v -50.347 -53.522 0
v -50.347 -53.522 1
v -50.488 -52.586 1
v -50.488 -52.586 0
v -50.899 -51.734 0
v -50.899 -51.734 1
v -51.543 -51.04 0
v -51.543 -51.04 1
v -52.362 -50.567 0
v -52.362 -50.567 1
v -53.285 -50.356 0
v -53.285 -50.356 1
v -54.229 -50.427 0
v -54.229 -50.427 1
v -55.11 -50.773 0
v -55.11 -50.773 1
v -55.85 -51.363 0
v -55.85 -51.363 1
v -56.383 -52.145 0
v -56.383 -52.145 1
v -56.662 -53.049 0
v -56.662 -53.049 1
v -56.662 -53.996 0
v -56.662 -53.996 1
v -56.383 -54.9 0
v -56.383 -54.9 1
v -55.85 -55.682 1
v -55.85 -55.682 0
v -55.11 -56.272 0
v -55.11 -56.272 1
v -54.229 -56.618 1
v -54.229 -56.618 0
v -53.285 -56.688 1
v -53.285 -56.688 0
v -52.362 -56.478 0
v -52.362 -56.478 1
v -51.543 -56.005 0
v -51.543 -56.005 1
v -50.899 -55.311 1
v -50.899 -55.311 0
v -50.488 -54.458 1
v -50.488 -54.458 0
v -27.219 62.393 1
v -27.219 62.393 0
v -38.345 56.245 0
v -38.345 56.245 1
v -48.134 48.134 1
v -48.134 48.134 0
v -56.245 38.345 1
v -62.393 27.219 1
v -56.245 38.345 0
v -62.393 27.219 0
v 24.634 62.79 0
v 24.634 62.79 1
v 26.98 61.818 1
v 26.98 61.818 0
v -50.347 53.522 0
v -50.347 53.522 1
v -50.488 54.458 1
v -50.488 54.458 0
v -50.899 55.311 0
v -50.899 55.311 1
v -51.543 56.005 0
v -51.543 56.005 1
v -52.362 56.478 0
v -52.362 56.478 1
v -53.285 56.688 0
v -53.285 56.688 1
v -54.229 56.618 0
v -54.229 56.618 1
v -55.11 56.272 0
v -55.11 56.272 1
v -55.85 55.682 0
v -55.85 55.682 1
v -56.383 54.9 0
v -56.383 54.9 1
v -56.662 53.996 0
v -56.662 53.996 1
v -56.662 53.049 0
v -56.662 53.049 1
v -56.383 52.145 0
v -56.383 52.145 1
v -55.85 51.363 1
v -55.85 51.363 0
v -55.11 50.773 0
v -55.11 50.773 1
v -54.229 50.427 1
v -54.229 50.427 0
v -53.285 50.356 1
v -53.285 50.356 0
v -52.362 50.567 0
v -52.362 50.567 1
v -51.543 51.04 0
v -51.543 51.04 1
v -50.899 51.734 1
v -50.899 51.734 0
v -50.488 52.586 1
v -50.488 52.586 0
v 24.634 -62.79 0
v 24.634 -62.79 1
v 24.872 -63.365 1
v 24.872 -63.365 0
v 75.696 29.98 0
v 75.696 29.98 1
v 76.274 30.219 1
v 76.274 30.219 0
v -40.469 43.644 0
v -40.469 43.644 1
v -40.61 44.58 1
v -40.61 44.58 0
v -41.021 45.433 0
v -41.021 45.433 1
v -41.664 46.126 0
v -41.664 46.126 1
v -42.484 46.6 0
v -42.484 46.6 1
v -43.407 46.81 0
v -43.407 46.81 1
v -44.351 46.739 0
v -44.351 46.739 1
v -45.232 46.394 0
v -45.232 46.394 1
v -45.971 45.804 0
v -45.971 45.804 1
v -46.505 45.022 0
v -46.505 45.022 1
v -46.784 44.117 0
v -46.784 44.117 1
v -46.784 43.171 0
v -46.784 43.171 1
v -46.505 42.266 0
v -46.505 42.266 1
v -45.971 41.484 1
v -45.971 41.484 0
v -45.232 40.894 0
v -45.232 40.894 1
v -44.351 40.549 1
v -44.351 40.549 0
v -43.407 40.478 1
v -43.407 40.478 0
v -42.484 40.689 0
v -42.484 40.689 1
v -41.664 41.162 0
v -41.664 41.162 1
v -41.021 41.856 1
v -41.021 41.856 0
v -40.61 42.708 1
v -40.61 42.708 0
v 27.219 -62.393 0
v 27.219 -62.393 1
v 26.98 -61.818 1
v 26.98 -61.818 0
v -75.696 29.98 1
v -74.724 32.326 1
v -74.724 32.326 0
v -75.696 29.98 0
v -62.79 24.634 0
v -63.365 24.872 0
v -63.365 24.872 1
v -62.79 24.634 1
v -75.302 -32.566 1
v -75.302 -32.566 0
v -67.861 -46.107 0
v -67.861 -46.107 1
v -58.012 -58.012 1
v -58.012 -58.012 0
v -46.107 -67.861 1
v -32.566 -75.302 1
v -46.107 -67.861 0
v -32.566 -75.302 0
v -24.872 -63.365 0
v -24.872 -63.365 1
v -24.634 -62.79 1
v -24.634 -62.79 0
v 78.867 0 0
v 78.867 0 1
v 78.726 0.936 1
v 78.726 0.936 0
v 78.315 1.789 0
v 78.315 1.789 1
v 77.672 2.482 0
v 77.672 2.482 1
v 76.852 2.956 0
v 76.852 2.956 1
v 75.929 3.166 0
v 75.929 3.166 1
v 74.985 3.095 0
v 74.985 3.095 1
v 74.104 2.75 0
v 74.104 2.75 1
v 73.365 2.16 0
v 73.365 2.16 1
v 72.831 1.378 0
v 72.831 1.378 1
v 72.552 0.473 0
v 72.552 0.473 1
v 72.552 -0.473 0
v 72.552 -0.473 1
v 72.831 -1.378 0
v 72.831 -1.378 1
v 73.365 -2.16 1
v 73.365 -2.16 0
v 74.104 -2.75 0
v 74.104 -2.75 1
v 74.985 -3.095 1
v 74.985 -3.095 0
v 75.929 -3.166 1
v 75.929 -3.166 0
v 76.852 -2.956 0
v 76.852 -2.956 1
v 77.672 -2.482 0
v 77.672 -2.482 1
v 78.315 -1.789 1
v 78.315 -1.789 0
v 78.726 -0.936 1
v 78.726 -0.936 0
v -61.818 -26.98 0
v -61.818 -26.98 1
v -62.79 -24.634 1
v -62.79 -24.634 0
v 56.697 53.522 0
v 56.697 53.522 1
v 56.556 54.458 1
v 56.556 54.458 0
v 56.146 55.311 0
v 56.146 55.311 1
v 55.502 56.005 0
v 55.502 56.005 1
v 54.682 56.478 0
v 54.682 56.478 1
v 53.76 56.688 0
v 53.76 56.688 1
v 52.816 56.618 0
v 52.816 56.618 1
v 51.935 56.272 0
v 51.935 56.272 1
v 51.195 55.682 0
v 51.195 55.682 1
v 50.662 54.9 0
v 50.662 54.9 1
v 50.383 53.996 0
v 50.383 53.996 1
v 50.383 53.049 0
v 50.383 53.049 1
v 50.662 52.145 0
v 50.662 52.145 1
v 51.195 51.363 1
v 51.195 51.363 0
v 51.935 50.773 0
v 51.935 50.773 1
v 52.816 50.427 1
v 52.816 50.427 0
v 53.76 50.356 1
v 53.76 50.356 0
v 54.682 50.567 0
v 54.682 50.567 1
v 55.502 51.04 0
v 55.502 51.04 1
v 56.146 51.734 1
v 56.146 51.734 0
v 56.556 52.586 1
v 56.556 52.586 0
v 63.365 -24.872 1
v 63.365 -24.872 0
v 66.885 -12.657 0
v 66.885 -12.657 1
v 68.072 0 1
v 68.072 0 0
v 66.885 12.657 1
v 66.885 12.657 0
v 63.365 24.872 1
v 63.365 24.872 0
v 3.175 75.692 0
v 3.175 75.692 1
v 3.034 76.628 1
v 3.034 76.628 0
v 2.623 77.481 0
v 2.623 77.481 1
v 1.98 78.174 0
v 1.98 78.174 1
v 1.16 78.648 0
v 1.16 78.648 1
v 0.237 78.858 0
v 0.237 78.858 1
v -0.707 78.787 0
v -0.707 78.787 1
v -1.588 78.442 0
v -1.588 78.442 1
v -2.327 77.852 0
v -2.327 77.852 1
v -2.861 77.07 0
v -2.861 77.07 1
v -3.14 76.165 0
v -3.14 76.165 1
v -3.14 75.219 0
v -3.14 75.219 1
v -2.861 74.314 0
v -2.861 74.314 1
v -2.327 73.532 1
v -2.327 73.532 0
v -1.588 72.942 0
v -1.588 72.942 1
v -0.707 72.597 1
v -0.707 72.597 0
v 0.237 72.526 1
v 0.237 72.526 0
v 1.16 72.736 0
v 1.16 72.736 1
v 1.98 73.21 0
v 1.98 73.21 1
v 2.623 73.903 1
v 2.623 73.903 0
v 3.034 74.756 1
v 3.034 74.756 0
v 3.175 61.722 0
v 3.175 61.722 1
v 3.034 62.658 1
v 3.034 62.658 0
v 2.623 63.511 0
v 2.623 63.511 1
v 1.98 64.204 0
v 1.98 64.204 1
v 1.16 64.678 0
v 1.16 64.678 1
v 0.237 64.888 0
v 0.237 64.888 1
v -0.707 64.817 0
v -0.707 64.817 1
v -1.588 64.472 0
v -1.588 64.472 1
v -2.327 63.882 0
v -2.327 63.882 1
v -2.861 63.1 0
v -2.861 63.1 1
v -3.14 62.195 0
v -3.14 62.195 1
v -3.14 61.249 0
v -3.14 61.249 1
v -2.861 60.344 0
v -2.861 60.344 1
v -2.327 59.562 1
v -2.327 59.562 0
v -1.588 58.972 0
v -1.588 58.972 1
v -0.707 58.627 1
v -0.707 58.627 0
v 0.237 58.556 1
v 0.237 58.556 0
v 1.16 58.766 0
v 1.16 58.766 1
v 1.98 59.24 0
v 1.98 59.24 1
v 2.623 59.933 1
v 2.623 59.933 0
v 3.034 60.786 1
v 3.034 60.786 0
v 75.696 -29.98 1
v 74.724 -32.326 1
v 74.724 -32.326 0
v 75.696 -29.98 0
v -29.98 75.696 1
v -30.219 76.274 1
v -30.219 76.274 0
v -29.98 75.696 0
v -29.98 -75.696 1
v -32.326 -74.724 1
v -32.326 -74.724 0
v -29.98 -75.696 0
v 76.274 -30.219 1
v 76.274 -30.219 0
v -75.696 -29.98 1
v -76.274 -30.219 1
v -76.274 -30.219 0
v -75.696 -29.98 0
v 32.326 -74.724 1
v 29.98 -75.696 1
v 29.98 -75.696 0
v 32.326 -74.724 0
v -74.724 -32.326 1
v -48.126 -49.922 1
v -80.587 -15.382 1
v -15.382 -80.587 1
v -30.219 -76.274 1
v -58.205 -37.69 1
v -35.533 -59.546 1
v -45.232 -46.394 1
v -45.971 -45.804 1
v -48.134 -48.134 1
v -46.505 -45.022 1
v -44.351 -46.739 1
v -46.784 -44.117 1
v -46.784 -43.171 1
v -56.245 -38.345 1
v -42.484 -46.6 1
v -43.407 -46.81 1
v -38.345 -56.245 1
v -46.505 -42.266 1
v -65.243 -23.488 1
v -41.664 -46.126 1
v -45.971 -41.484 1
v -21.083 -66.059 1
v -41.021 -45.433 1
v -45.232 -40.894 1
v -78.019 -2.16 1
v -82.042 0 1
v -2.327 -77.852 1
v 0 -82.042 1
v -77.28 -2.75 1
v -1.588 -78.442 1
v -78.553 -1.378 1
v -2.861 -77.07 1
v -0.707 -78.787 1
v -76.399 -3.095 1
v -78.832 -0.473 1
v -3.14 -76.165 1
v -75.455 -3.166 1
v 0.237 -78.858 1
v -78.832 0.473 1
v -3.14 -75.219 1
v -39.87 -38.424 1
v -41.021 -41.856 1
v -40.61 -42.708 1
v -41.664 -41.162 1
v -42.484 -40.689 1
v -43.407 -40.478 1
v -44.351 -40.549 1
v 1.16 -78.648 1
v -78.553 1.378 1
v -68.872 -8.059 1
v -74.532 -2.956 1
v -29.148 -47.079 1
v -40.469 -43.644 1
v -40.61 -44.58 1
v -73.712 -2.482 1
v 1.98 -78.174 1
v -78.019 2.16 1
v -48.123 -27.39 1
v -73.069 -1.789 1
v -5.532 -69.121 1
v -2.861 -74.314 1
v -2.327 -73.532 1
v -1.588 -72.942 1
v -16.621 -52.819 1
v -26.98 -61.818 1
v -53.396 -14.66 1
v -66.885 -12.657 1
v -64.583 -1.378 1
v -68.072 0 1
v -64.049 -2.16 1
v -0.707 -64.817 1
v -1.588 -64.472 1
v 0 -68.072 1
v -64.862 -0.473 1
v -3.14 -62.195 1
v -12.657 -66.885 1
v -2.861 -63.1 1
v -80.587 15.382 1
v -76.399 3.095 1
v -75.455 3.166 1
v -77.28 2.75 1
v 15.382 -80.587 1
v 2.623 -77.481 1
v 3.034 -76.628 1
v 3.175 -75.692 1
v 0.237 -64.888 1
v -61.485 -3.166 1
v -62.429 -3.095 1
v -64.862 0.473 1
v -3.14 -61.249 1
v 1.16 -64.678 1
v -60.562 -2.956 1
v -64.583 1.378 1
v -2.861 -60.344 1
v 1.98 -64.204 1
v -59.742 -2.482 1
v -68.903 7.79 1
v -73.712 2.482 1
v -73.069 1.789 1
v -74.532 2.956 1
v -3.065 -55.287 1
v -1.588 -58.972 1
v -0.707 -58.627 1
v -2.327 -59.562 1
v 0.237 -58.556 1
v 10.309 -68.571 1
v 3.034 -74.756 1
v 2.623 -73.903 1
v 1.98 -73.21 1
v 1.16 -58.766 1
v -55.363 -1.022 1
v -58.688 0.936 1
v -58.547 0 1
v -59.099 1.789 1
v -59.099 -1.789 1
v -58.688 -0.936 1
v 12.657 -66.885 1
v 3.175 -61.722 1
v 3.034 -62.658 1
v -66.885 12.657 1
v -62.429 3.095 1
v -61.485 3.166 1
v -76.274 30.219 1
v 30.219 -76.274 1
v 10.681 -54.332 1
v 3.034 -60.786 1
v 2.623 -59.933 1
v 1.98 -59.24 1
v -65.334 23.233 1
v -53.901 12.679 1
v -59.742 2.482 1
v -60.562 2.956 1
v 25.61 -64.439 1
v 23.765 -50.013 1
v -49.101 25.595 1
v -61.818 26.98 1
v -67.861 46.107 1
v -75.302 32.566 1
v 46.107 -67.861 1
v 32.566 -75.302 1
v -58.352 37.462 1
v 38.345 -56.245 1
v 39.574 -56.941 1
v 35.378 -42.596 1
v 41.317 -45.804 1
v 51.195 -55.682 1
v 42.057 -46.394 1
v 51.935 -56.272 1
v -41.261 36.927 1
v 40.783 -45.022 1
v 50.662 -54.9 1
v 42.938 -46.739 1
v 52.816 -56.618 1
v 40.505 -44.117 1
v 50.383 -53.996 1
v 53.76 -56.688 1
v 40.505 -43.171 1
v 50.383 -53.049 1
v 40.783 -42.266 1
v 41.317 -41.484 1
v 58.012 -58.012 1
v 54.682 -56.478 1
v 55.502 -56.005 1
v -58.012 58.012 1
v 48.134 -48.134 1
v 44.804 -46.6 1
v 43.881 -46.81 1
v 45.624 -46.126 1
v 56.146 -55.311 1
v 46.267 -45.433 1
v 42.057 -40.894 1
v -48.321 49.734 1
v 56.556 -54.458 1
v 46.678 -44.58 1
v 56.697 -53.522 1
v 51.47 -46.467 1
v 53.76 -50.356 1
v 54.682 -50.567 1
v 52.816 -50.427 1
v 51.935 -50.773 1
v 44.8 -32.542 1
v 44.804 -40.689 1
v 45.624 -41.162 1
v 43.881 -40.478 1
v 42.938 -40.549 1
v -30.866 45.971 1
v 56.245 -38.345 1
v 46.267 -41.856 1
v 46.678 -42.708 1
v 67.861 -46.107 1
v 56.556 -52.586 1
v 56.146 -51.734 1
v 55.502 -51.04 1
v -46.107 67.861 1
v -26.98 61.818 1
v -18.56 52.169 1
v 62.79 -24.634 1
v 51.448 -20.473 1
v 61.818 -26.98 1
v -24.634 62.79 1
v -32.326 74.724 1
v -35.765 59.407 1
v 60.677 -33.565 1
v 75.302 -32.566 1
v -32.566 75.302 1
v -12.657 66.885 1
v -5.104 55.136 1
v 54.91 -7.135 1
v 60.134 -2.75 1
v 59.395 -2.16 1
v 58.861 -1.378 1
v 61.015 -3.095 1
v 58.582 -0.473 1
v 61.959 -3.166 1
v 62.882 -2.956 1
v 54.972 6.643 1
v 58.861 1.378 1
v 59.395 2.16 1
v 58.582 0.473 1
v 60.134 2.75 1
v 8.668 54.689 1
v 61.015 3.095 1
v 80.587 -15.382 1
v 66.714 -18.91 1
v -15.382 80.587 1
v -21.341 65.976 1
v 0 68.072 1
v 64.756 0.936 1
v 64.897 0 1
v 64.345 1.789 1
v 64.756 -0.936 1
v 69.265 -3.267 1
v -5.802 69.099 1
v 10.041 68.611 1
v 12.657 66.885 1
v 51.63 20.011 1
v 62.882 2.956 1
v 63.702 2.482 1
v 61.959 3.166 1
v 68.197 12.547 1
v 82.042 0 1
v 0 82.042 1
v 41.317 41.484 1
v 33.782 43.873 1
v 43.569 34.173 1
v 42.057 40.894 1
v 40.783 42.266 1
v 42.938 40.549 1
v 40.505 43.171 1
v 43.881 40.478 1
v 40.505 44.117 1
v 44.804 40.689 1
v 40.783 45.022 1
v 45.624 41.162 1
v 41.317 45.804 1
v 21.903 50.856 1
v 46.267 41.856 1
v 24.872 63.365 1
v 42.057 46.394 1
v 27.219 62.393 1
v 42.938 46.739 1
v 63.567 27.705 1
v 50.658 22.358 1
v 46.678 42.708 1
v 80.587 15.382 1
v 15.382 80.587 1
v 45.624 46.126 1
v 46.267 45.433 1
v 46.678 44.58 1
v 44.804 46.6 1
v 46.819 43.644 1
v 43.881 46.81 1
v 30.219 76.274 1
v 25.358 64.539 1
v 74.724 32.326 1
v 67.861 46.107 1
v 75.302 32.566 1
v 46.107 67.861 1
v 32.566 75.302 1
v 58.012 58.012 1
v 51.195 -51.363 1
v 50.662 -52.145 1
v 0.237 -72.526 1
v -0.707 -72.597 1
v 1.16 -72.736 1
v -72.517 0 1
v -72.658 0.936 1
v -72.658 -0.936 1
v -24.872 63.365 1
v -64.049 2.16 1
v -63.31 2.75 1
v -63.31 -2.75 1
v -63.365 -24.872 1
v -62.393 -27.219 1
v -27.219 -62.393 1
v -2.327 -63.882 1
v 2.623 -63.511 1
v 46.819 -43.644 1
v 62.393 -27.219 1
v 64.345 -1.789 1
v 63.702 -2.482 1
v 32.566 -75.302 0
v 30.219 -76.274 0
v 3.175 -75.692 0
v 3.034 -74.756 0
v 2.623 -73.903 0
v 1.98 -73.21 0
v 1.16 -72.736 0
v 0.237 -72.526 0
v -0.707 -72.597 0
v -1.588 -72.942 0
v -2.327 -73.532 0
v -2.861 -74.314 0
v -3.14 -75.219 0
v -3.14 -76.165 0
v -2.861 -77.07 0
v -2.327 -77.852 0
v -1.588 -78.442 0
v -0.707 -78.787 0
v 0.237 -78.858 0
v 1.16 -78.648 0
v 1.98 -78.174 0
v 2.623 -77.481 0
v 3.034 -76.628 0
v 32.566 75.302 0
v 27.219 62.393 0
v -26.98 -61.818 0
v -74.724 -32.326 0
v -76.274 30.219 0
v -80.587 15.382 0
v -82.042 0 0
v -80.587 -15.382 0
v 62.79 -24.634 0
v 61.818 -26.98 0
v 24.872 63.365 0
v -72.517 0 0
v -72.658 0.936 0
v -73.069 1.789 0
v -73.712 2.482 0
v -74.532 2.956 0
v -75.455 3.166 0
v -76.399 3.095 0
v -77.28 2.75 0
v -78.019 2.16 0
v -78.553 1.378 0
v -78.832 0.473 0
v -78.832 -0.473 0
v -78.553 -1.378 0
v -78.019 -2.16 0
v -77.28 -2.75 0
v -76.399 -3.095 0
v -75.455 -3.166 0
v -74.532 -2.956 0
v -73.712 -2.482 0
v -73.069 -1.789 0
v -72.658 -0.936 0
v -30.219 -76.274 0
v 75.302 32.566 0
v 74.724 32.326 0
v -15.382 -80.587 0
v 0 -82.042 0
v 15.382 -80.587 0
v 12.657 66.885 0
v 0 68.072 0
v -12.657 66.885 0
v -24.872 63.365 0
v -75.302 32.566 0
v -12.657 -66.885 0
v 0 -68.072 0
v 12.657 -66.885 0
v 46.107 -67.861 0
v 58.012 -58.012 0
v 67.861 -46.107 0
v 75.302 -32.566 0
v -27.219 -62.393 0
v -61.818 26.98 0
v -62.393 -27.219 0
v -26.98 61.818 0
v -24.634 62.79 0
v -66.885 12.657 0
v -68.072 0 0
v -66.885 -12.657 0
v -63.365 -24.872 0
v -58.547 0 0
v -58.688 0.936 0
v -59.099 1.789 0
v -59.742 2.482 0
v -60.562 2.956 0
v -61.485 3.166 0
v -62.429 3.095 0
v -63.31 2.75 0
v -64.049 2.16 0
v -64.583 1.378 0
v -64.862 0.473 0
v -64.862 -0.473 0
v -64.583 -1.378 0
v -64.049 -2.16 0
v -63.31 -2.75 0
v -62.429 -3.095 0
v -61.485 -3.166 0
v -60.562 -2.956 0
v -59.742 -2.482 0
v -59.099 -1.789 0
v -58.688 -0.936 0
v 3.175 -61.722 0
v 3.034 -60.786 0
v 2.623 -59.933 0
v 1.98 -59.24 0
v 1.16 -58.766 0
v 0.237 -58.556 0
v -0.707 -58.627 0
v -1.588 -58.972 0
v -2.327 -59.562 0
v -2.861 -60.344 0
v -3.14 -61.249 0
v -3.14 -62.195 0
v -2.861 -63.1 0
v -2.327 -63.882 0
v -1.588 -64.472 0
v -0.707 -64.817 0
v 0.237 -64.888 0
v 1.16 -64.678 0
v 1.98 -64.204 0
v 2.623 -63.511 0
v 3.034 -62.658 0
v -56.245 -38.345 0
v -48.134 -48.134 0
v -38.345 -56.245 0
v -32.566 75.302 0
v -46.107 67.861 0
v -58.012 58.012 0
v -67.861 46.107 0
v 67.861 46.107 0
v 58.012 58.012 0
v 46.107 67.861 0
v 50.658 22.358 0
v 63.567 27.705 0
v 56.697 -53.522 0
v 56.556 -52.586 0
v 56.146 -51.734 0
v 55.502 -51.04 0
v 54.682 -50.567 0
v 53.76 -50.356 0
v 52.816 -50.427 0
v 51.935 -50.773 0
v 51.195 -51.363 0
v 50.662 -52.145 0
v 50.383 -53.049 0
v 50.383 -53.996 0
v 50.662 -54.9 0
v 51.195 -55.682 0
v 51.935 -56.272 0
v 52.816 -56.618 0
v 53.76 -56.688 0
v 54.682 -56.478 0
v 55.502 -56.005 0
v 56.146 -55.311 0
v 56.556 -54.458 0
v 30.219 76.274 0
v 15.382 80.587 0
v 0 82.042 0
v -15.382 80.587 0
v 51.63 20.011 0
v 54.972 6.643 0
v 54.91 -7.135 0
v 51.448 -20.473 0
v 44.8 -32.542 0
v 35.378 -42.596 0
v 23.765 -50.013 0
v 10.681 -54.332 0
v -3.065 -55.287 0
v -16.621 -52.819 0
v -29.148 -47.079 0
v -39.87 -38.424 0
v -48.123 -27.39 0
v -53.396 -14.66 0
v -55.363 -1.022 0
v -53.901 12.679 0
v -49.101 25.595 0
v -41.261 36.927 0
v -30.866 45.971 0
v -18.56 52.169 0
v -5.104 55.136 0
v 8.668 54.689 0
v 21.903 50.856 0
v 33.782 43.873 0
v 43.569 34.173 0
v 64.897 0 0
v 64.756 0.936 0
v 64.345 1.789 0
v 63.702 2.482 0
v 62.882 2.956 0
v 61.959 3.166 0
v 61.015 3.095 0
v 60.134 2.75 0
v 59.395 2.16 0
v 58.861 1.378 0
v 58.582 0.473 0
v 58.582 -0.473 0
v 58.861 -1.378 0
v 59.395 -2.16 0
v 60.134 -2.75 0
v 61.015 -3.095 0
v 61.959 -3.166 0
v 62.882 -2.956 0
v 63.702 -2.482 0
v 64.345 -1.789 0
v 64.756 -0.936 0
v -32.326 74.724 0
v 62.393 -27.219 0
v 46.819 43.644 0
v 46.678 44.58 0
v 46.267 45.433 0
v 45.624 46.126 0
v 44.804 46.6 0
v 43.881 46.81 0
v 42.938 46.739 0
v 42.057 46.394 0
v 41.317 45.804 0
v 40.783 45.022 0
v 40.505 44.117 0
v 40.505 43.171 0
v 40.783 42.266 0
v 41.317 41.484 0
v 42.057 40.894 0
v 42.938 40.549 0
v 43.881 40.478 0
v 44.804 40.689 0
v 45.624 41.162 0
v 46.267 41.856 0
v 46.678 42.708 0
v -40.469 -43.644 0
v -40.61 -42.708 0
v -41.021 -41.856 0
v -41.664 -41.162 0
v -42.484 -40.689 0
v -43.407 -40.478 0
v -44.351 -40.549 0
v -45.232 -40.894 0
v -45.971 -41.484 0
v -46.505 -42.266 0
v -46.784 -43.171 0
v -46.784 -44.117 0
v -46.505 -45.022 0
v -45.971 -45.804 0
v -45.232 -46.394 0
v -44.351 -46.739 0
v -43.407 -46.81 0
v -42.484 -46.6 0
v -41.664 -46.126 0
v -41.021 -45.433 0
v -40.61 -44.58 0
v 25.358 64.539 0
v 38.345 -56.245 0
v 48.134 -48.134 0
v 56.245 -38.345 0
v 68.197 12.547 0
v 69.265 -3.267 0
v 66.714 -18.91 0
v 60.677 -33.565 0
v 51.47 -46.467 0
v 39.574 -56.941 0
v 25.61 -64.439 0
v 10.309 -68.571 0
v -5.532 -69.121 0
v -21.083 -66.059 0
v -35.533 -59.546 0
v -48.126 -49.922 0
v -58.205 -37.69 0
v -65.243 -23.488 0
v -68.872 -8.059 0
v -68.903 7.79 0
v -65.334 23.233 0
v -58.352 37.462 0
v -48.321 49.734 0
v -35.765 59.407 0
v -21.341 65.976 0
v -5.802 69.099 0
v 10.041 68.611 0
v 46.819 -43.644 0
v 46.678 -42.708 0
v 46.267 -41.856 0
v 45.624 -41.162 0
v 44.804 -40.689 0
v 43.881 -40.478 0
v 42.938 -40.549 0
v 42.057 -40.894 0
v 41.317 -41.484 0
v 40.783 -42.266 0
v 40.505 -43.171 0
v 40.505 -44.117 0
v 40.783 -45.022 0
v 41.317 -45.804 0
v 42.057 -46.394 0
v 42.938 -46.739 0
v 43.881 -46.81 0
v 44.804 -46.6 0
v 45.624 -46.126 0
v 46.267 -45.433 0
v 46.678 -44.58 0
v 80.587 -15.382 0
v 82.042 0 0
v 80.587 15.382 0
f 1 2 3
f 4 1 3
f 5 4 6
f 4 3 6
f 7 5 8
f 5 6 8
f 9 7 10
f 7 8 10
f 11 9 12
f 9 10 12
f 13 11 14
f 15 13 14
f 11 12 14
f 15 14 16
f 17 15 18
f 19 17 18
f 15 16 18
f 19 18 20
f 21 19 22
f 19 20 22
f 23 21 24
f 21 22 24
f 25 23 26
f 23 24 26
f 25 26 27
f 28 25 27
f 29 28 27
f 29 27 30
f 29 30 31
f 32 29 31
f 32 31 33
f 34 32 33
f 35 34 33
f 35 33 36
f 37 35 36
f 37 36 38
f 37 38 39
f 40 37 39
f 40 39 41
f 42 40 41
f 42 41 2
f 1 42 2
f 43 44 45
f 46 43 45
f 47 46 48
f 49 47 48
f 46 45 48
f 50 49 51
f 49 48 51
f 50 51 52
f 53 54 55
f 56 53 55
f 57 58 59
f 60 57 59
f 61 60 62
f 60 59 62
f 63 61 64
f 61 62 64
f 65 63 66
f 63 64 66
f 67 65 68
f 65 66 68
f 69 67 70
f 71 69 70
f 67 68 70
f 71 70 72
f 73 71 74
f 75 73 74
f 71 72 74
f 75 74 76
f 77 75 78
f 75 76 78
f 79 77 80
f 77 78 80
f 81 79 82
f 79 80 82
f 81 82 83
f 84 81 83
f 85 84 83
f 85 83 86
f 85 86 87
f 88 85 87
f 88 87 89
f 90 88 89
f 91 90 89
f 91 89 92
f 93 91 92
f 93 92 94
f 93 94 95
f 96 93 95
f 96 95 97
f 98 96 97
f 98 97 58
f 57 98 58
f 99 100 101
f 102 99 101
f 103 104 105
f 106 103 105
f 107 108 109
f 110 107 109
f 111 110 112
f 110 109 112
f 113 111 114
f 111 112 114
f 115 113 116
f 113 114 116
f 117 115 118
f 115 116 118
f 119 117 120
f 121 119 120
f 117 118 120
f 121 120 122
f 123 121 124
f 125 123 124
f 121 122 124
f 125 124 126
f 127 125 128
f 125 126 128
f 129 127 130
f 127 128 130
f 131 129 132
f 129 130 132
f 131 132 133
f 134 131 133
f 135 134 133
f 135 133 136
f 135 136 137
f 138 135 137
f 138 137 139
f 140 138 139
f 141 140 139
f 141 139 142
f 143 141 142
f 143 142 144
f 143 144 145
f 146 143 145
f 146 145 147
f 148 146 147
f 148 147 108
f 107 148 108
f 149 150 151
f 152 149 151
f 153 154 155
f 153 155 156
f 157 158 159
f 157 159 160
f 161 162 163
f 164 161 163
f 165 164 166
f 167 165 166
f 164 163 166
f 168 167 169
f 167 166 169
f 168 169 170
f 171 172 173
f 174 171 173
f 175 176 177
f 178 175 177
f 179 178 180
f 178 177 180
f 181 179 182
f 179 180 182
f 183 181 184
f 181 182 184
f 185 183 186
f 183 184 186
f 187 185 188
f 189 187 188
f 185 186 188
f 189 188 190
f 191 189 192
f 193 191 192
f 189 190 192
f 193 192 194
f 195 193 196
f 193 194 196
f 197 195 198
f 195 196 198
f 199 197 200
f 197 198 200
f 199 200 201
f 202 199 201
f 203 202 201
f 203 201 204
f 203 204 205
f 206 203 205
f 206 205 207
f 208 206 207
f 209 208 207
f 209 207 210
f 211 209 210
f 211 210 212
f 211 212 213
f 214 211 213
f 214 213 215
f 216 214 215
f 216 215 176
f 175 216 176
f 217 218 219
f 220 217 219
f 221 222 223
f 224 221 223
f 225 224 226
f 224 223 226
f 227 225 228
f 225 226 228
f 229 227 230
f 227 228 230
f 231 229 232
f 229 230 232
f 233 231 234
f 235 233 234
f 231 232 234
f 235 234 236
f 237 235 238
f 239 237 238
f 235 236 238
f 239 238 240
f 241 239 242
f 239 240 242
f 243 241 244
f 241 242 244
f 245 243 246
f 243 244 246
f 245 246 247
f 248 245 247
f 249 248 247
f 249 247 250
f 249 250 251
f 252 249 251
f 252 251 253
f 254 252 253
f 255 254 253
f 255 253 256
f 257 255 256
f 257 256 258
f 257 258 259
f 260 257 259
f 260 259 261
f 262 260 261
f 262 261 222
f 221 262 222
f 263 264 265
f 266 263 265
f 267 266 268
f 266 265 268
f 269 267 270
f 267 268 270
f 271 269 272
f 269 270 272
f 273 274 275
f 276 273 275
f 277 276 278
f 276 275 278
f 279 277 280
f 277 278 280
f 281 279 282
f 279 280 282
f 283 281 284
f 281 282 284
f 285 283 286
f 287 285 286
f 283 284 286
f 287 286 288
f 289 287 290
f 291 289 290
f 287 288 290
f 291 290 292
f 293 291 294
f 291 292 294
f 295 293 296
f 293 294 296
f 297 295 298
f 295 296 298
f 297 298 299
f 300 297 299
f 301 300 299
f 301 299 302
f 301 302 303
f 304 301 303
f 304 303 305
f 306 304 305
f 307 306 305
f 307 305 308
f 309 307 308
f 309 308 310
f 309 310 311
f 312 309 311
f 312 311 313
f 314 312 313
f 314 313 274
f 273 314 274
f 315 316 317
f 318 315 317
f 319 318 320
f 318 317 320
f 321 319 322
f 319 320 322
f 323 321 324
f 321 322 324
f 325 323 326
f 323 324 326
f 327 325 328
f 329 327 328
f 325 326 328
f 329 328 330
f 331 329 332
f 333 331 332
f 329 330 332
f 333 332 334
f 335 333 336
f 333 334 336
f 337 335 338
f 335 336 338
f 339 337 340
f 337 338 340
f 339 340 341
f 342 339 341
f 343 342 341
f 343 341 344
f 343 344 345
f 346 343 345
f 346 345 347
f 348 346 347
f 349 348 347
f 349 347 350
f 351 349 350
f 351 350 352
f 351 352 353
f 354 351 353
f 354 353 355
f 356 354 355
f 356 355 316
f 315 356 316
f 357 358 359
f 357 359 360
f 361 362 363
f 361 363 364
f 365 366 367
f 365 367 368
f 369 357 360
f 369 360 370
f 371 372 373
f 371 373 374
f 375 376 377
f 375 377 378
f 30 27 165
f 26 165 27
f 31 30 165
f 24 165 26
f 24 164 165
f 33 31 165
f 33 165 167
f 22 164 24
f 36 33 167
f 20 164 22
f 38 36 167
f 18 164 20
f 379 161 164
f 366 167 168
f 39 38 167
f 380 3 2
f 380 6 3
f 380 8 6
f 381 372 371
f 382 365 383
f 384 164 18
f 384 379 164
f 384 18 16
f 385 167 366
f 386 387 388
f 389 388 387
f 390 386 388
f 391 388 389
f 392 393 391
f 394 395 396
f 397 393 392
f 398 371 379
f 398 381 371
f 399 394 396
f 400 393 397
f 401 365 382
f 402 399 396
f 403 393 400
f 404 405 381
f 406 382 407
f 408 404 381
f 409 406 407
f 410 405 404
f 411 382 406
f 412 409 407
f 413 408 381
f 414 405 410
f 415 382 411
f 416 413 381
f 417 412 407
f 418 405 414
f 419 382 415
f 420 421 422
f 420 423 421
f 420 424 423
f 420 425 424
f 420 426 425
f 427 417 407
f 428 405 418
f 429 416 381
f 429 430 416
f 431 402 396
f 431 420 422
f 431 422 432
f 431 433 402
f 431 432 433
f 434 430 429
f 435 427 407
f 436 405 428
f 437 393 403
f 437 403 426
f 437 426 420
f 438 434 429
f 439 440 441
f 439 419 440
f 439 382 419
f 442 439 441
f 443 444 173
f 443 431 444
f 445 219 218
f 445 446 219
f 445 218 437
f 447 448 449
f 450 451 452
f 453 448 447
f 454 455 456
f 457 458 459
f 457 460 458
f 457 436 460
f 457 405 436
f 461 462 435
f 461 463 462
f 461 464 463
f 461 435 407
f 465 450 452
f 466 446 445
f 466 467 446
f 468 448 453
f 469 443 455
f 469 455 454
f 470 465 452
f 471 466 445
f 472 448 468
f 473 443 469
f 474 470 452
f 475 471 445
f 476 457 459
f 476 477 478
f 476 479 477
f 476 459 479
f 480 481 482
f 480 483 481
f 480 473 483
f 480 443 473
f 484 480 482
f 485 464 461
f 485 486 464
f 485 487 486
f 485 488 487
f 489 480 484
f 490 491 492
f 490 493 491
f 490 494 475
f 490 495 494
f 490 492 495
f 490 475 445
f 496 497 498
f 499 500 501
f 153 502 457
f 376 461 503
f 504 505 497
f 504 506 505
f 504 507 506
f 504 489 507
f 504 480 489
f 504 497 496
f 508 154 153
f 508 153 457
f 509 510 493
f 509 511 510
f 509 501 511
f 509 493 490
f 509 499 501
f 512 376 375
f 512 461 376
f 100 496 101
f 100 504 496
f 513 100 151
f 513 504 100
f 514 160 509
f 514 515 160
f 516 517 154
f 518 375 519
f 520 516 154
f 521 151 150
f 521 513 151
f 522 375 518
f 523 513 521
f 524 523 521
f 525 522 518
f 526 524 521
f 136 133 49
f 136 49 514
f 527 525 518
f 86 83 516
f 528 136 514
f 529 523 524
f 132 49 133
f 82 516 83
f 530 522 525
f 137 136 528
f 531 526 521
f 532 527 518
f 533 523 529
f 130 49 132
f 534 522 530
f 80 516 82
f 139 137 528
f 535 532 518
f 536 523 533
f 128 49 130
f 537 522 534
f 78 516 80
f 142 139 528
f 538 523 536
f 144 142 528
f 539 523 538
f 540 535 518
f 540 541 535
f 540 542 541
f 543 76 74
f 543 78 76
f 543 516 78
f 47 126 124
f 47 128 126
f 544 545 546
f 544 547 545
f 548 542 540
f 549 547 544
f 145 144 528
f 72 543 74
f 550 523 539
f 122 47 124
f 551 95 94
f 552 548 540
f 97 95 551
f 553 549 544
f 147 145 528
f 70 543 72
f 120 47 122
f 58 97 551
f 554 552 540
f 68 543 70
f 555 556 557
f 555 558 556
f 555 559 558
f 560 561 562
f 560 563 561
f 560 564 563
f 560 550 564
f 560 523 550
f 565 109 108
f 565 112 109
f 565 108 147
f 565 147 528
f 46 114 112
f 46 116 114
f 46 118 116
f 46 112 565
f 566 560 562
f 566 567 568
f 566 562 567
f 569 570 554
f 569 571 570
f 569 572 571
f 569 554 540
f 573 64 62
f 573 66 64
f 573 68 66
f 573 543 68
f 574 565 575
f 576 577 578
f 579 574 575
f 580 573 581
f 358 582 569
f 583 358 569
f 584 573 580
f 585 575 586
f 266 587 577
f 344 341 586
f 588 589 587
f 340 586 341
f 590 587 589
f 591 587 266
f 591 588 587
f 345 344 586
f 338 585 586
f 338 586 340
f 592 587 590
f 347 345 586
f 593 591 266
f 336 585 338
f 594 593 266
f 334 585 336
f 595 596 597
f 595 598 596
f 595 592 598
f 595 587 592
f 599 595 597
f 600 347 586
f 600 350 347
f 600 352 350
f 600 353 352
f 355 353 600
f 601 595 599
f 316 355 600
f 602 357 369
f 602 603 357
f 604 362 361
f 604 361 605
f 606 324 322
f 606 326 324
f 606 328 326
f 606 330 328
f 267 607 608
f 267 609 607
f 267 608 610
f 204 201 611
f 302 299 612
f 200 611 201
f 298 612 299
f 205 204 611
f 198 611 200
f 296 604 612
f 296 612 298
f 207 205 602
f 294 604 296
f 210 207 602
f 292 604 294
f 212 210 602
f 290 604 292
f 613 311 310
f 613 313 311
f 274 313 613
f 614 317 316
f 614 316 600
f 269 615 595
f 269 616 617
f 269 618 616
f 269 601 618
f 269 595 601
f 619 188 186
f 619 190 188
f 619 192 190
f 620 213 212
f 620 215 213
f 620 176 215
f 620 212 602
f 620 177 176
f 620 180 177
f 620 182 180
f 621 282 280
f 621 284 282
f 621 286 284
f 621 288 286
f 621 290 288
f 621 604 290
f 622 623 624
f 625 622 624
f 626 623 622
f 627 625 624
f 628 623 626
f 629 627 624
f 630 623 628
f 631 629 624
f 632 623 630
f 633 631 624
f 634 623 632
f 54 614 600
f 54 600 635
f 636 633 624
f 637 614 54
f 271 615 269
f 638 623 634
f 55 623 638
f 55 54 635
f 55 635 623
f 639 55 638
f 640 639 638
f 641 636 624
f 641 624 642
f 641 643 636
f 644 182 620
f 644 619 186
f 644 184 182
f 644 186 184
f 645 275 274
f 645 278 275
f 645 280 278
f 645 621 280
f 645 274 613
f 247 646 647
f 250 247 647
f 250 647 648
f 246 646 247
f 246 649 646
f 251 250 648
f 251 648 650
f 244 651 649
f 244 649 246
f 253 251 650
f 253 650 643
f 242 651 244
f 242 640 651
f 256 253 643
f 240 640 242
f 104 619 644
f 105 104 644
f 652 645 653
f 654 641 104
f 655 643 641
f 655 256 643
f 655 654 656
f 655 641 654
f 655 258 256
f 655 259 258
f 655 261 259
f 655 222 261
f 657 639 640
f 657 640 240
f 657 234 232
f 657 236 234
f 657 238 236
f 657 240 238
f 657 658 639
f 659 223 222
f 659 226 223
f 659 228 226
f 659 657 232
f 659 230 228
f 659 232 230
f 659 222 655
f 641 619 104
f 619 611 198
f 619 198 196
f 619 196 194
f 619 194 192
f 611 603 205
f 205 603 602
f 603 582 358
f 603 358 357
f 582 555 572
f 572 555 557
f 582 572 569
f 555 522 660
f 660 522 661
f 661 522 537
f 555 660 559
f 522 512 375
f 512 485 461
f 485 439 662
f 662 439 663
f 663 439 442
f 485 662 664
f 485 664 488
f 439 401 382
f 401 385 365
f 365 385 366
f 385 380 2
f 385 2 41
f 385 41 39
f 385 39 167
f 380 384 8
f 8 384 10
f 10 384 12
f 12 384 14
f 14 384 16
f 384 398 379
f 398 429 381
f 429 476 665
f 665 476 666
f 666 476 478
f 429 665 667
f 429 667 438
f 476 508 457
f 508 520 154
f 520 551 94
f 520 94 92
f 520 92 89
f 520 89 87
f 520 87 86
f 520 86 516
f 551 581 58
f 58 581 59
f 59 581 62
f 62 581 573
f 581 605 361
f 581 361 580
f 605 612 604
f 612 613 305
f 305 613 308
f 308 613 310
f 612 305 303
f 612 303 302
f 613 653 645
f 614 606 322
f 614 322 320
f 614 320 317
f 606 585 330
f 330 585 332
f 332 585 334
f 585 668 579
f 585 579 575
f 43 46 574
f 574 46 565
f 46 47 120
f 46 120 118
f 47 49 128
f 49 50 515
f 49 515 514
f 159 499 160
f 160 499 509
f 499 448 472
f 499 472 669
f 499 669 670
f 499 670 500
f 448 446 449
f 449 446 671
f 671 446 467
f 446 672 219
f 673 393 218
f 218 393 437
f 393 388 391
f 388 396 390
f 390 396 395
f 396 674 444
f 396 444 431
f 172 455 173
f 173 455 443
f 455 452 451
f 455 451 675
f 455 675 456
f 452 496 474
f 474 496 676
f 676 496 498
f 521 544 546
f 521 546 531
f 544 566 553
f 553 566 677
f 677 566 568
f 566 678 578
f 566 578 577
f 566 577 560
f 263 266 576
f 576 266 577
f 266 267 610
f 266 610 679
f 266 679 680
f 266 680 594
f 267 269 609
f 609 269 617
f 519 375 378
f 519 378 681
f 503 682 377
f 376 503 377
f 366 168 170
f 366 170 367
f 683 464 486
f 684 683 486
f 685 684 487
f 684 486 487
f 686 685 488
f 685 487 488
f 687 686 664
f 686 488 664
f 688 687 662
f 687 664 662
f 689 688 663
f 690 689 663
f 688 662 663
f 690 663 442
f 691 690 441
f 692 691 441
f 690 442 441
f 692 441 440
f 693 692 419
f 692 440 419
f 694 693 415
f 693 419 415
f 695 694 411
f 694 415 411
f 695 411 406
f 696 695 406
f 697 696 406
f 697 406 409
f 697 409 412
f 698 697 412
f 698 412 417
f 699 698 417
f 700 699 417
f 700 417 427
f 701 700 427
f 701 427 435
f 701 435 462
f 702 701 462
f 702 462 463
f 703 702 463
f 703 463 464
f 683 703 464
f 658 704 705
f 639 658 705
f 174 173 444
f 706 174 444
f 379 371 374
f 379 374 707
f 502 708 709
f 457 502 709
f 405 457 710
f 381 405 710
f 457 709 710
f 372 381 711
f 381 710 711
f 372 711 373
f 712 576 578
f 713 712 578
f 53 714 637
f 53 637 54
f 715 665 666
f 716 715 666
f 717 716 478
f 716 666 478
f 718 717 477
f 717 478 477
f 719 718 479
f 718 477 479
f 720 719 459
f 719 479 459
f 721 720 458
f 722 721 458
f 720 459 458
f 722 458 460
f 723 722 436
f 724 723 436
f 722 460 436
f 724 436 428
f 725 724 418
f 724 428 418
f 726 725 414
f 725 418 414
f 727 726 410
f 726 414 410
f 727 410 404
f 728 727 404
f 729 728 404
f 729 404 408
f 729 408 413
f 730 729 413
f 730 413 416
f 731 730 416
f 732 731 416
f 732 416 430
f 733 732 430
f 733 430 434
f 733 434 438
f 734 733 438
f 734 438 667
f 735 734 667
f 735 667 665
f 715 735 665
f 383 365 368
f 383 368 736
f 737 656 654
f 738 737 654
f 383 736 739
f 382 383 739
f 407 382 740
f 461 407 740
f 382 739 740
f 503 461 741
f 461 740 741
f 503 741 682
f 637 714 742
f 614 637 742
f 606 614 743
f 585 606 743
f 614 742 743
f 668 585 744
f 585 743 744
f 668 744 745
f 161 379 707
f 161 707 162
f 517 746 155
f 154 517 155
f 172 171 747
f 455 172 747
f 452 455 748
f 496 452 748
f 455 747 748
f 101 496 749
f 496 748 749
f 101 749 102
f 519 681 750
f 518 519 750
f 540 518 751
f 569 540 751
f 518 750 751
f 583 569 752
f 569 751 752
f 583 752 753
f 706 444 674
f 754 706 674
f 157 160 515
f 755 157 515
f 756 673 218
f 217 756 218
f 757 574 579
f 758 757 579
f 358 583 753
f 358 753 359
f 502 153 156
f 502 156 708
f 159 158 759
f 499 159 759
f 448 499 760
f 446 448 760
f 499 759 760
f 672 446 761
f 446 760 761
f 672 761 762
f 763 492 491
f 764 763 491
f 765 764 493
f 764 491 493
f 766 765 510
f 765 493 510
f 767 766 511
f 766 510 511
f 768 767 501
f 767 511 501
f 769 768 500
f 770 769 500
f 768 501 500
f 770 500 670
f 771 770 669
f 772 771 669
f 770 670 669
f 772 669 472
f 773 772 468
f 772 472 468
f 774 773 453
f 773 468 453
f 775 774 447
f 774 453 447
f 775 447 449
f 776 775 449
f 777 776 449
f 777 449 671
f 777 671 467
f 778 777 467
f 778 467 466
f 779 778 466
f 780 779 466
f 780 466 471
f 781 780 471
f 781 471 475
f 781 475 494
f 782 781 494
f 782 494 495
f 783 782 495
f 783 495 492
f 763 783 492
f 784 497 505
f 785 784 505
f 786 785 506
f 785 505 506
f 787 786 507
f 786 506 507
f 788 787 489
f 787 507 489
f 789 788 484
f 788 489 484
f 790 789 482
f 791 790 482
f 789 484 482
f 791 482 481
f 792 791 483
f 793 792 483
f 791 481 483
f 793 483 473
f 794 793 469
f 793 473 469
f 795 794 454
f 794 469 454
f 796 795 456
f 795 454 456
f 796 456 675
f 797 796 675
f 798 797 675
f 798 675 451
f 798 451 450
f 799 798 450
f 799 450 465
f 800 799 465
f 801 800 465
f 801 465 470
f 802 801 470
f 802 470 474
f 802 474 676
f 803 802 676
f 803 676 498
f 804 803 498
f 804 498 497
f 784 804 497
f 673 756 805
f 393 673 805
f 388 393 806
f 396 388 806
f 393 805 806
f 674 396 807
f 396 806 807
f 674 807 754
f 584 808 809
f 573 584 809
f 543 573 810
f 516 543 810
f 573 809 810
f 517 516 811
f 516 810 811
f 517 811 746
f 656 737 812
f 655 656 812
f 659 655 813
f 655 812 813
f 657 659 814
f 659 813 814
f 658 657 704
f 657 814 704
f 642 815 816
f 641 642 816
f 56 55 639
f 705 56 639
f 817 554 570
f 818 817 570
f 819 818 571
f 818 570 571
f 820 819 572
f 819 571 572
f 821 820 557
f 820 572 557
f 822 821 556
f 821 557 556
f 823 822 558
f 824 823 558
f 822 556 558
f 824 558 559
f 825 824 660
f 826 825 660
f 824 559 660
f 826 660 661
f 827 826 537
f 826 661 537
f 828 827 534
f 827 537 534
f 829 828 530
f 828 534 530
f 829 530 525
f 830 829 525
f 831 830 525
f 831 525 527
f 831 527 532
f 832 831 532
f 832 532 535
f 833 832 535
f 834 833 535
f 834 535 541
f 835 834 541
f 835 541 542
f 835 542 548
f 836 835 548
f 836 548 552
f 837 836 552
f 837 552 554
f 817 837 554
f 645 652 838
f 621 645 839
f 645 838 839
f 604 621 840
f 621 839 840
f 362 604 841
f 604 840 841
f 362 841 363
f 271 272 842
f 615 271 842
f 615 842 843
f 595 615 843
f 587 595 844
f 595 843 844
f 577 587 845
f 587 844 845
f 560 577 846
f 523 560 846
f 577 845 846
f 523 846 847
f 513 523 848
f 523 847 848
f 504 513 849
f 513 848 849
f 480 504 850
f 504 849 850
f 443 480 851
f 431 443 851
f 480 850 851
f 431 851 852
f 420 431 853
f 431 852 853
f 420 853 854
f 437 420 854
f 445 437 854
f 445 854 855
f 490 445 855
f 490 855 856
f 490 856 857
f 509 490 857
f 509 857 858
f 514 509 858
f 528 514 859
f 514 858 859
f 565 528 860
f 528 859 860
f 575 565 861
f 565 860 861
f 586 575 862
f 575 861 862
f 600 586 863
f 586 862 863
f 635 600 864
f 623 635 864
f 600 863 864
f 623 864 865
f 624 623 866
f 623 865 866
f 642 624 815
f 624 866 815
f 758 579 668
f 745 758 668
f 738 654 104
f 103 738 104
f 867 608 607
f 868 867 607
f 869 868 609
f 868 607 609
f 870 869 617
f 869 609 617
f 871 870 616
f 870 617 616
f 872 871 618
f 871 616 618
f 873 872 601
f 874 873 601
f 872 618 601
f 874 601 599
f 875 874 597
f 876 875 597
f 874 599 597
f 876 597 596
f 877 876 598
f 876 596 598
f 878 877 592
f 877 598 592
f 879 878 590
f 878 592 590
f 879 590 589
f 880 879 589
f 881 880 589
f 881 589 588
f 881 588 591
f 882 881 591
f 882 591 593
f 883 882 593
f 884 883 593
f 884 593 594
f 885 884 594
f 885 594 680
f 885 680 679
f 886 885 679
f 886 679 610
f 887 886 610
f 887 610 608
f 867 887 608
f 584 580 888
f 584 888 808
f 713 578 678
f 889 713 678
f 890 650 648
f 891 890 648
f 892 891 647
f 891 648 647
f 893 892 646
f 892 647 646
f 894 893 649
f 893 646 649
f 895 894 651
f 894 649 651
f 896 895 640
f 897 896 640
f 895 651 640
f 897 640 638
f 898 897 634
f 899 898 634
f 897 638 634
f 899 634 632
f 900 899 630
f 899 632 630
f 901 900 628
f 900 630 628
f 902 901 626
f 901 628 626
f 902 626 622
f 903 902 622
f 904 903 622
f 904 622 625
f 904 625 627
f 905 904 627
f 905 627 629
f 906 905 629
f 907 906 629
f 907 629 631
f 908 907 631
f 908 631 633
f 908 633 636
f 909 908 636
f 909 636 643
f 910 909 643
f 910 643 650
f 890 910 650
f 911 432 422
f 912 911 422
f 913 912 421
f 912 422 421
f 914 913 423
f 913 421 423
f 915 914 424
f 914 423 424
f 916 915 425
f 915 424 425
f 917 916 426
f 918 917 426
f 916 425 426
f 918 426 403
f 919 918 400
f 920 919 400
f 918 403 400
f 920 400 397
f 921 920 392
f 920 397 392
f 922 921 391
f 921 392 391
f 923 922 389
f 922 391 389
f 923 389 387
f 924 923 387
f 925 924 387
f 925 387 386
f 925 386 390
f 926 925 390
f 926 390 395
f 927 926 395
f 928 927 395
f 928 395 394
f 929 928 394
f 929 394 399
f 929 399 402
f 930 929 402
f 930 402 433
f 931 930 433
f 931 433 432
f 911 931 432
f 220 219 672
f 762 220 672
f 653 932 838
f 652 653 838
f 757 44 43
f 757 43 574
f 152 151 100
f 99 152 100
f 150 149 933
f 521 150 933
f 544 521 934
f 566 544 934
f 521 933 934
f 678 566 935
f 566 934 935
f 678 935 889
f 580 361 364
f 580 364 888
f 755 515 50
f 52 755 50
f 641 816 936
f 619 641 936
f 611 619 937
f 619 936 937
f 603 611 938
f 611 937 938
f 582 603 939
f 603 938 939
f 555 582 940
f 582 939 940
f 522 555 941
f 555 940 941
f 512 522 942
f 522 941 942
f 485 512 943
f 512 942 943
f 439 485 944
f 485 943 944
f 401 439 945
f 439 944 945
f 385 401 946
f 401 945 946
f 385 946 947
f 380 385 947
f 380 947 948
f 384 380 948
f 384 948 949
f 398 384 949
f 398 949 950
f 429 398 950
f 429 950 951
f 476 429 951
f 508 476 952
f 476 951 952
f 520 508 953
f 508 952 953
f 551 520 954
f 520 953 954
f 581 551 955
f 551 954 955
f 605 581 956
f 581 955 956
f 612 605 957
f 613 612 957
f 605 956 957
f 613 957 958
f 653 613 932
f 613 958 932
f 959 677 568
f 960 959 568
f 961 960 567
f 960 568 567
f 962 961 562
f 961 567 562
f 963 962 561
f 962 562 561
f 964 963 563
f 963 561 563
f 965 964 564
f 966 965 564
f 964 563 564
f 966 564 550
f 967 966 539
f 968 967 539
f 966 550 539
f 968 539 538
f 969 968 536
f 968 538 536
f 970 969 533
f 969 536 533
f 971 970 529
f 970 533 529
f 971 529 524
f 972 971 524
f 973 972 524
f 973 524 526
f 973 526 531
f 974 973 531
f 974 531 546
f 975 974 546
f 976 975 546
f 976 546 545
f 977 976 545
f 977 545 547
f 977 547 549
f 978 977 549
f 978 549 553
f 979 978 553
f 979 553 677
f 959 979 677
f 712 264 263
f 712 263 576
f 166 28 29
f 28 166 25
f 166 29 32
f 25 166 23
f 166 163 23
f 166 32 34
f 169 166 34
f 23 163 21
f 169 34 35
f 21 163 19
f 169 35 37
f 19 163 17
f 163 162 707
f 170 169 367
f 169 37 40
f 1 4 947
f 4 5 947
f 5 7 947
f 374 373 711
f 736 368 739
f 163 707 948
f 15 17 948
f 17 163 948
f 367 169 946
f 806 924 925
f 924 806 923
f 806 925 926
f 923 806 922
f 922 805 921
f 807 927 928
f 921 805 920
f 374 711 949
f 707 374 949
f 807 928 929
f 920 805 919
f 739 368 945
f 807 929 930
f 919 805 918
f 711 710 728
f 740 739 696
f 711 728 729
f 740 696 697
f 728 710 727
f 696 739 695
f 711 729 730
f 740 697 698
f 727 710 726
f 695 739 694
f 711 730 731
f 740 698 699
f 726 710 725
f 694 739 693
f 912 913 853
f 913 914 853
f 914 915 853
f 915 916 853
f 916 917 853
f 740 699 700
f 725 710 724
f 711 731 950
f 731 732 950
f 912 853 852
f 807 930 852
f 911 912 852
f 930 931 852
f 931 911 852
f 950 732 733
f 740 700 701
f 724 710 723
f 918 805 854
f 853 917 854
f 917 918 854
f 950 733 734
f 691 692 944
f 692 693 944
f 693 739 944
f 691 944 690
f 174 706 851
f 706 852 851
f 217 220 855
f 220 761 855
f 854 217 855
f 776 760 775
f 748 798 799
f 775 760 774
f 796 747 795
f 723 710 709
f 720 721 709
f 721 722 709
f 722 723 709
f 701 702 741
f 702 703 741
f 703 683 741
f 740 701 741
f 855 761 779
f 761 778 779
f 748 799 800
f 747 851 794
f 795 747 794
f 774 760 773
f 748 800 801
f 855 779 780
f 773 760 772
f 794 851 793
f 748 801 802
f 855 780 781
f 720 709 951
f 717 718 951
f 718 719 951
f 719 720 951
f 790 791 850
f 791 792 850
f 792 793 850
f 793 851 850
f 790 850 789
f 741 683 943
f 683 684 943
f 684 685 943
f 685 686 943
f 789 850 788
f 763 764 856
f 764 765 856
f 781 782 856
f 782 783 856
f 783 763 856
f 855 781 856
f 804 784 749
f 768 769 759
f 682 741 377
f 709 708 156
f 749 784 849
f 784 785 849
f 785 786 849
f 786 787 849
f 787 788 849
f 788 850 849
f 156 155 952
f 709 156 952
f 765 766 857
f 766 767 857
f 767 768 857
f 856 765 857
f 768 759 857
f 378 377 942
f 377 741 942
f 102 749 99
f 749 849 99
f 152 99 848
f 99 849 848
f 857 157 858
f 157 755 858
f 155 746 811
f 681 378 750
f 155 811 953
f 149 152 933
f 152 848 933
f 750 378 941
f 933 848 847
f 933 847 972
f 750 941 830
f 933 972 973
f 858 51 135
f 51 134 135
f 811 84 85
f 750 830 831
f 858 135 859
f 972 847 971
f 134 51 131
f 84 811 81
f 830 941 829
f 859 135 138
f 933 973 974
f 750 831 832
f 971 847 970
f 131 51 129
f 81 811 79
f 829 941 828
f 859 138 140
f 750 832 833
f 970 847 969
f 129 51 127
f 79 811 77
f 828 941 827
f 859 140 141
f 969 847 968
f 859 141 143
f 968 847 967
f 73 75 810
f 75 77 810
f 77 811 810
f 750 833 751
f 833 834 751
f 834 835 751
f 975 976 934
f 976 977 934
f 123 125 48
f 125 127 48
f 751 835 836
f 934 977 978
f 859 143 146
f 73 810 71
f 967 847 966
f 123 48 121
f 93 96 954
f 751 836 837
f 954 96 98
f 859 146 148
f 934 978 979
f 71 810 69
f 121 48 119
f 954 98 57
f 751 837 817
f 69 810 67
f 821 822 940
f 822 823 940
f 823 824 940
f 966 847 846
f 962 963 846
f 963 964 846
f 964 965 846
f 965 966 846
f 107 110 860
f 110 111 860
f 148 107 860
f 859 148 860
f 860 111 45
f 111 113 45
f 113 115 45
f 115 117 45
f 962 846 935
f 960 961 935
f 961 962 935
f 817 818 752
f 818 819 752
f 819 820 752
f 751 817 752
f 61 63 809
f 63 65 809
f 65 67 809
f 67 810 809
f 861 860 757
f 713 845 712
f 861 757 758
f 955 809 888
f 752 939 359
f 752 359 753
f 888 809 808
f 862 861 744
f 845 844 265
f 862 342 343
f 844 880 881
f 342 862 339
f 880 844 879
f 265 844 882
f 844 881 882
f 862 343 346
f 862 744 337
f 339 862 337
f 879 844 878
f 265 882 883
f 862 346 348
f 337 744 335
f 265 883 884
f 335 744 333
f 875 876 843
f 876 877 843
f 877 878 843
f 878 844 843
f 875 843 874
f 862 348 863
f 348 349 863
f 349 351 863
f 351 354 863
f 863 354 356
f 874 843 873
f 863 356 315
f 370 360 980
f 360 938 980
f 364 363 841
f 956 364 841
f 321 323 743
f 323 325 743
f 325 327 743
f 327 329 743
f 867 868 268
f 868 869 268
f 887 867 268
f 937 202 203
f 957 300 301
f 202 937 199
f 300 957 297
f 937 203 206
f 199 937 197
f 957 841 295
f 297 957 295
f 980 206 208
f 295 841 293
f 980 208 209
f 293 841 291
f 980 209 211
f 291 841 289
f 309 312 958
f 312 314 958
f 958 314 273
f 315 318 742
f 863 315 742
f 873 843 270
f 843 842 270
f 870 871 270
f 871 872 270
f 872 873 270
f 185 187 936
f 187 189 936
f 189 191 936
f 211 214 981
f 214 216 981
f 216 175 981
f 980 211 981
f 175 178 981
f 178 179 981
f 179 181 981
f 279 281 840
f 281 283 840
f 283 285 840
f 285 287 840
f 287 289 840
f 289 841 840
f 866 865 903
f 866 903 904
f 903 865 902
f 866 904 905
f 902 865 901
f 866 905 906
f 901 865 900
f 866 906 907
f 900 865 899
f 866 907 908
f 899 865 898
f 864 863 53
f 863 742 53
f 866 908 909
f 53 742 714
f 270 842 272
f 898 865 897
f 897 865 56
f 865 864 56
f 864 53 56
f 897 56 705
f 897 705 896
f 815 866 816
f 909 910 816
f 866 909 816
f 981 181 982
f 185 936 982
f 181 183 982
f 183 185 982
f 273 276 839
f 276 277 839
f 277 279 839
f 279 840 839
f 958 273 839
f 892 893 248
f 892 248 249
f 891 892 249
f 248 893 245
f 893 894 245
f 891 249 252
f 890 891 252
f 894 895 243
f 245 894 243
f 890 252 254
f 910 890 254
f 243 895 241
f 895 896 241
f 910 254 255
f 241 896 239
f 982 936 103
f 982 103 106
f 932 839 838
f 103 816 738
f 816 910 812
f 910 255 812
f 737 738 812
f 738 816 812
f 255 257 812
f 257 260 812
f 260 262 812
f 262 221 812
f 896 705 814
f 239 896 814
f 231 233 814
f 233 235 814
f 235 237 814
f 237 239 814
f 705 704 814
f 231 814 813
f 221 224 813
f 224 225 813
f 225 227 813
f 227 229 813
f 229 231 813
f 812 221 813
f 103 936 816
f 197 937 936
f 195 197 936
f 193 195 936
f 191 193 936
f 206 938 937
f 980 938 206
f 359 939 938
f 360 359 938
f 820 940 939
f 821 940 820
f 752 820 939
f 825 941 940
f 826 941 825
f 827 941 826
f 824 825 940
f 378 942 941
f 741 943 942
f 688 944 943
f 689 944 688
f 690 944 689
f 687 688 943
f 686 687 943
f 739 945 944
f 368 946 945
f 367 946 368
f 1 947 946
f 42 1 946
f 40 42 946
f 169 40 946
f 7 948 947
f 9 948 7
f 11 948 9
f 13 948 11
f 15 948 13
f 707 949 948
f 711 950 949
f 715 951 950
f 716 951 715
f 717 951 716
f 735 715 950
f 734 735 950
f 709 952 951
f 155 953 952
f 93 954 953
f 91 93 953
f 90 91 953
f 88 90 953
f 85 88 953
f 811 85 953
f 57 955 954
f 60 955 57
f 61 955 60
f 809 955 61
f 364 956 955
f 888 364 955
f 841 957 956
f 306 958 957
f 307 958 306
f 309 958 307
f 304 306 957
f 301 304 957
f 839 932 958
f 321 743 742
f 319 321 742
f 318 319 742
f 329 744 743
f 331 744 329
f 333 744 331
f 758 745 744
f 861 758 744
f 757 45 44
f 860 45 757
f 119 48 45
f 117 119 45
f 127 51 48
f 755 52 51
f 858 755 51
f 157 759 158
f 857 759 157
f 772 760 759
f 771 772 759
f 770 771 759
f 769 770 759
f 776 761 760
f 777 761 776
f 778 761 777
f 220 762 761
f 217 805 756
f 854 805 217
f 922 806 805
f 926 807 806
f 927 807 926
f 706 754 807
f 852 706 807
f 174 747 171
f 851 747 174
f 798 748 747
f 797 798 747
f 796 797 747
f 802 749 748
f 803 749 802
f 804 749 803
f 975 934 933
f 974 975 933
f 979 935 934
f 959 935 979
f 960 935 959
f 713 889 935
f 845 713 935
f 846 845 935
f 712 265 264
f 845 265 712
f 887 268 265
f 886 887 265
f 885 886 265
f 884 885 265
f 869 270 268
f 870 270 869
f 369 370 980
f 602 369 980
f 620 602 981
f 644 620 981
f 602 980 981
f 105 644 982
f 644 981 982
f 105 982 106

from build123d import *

# Parameters (mm, degrees)
BOSS_EXTRUDE1_DEPTH = 1
SKETCH2_R           = 3.17500001
SKETCH2_R_2         = 3.175
CUT_EXTRUDE1_DEPTH  = 2
CUT_EXTRUDE2_DEPTH  = 2


with BuildPart() as part:
    # Sketch1 → Boss-Extrude1 (new body)
    with BuildSketch(Plane.XY):
        with BuildLine():
            Line((25.358256565, 64.538916848), (30.219025255, 76.273850543))
            ThreePointArc((30.219025255, 76.273850543), (-31.396114158, -75.796924606), (32.565679267, 75.301834625))
            Line((32.565679267, 75.301834625), (27.218819563, 62.393373411))
            ThreePointArc((27.218819563, 62.393373411), (-49.023820587, -47.227769363), (63.365389329, 24.872165551))
            Line((63.365389329, 24.872165551), (51.629608078, 20.011045792))
            ThreePointArc((51.629608078, 20.011045792), (-51.157057474, -21.189947017), (50.65759216, 22.357699804))
            Line((50.65759216, 22.357699804), (63.56690093, 27.704910578))
            ThreePointArc((63.56690093, 27.704910578), (-48.125948441, -49.921999666), (25.358256565, 64.538916848))
        make_face()
    extrude(amount=BOSS_EXTRUDE1_DEPTH)

    # Sketch2 → Cut-Extrude1 (cut, through all)
    with BuildSketch(Plane.XY.offset(1)):
        with Locations((61.722, 0)):
            Circle(SKETCH2_R)
        with Locations((75.692, 0)):
            Circle(SKETCH2_R_2)
        with Locations((53.522326482, -53.522326482)):
            Circle(SKETCH2_R_2)
        with Locations((43.644044748, -43.644044748)):
            Circle(SKETCH2_R)
        with Locations((0, -75.692)):
            Circle(SKETCH2_R_2)
        with Locations((0, -61.722)):
            Circle(SKETCH2_R)
        with Locations((-53.522326482, -53.522326482)):
            Circle(SKETCH2_R_2)
        with Locations((-43.644044748, -43.644044748)):
            Circle(SKETCH2_R)
        with Locations((-75.692, 0)):
            Circle(SKETCH2_R_2)
        with Locations((-61.722, 0)):
            Circle(SKETCH2_R)
        with Locations((-53.522326482, 53.522326482)):
            Circle(SKETCH2_R_2)
        with Locations((-43.644044748, 43.644044748)):
            Circle(SKETCH2_R)
        with Locations((0, 75.692)):
            Circle(SKETCH2_R_2)
        with Locations((0, 61.722)):
            Circle(SKETCH2_R)
        with Locations((53.522326482, 53.522326482)):
            Circle(SKETCH2_R_2)
        with Locations((43.644044748, 43.644044748)):
            Circle(SKETCH2_R)
    extrude(amount=-CUT_EXTRUDE1_DEPTH, mode=Mode.SUBTRACT)

    # Sketch3 → Cut-Extrude2 (cut, through all)
    with BuildSketch(Plane.XY.offset(1)):
        Polygon((61.817656075, -26.980349635), (62.990983081, -27.466357594), (63.962998999, -25.119703581), (62.789671993, -24.633695622), align=None)
        Polygon((25.119703581, -63.962998999), (27.466357594, -62.990983081), (26.980349635, -61.817656075), (24.633695622, -62.789671993), align=None)
        Polygon((-27.466357594, -62.990983081), (-25.119703581, -63.962998999), (-24.633695622, -62.789671993), (-26.980349635, -61.817656075), align=None)
        Polygon((-63.962998999, -25.119703581), (-62.990983081, -27.466357594), (-61.817656075, -26.980349635), (-62.789671993, -24.633695622), align=None)
        Polygon((-62.990983081, 27.466357594), (-63.962998999, 25.119703581), (-62.789671993, 24.633695622), (-61.817656075, 26.980349635), align=None)
        Polygon((-25.119703581, 63.962998999), (-27.466357594, 62.990983081), (-26.980349635, 61.817656075), (-24.633695622, 62.789671993), align=None)
        Polygon((27.466357594, 62.990983081), (25.119703581, 63.962998999), (24.633695622, 62.789671993), (26.980349635, 61.817656075), align=None)
        Polygon((75.696269062, 29.979783172), (76.869596069, 30.465791131), (75.89758015, 32.812445144), (74.724253144, 32.326437185), align=None)
        Polygon((75.696269062, -29.979783172), (76.869596069, -30.465791131), (75.89758015, -32.812445144), (74.724253144, -32.326437185), align=None)
        Polygon((32.326437185, -74.724253144), (32.812445144, -75.89758015), (30.465791131, -76.869596069), (29.979783172, -75.696269062), align=None)
        Polygon((-29.979783172, -75.696269062), (-30.465791131, -76.869596069), (-32.812445144, -75.89758015), (-32.326437185, -74.724253144), align=None)
        Polygon((-74.724253144, -32.326437185), (-75.89758015, -32.812445144), (-76.869596069, -30.465791131), (-75.696269062, -29.979783172), align=None)
        Polygon((-75.696269062, 29.979783172), (-76.869596069, 30.465791131), (-75.89758015, 32.812445144), (-74.724253144, 32.326437185), align=None)
        Polygon((-32.326437185, 74.724253144), (-32.812445144, 75.89758015), (-30.465791131, 76.869596069), (-29.979783172, 75.696269062), align=None)
    extrude(amount=-CUT_EXTRUDE2_DEPTH, mode=Mode.SUBTRACT)


solid = part.part
